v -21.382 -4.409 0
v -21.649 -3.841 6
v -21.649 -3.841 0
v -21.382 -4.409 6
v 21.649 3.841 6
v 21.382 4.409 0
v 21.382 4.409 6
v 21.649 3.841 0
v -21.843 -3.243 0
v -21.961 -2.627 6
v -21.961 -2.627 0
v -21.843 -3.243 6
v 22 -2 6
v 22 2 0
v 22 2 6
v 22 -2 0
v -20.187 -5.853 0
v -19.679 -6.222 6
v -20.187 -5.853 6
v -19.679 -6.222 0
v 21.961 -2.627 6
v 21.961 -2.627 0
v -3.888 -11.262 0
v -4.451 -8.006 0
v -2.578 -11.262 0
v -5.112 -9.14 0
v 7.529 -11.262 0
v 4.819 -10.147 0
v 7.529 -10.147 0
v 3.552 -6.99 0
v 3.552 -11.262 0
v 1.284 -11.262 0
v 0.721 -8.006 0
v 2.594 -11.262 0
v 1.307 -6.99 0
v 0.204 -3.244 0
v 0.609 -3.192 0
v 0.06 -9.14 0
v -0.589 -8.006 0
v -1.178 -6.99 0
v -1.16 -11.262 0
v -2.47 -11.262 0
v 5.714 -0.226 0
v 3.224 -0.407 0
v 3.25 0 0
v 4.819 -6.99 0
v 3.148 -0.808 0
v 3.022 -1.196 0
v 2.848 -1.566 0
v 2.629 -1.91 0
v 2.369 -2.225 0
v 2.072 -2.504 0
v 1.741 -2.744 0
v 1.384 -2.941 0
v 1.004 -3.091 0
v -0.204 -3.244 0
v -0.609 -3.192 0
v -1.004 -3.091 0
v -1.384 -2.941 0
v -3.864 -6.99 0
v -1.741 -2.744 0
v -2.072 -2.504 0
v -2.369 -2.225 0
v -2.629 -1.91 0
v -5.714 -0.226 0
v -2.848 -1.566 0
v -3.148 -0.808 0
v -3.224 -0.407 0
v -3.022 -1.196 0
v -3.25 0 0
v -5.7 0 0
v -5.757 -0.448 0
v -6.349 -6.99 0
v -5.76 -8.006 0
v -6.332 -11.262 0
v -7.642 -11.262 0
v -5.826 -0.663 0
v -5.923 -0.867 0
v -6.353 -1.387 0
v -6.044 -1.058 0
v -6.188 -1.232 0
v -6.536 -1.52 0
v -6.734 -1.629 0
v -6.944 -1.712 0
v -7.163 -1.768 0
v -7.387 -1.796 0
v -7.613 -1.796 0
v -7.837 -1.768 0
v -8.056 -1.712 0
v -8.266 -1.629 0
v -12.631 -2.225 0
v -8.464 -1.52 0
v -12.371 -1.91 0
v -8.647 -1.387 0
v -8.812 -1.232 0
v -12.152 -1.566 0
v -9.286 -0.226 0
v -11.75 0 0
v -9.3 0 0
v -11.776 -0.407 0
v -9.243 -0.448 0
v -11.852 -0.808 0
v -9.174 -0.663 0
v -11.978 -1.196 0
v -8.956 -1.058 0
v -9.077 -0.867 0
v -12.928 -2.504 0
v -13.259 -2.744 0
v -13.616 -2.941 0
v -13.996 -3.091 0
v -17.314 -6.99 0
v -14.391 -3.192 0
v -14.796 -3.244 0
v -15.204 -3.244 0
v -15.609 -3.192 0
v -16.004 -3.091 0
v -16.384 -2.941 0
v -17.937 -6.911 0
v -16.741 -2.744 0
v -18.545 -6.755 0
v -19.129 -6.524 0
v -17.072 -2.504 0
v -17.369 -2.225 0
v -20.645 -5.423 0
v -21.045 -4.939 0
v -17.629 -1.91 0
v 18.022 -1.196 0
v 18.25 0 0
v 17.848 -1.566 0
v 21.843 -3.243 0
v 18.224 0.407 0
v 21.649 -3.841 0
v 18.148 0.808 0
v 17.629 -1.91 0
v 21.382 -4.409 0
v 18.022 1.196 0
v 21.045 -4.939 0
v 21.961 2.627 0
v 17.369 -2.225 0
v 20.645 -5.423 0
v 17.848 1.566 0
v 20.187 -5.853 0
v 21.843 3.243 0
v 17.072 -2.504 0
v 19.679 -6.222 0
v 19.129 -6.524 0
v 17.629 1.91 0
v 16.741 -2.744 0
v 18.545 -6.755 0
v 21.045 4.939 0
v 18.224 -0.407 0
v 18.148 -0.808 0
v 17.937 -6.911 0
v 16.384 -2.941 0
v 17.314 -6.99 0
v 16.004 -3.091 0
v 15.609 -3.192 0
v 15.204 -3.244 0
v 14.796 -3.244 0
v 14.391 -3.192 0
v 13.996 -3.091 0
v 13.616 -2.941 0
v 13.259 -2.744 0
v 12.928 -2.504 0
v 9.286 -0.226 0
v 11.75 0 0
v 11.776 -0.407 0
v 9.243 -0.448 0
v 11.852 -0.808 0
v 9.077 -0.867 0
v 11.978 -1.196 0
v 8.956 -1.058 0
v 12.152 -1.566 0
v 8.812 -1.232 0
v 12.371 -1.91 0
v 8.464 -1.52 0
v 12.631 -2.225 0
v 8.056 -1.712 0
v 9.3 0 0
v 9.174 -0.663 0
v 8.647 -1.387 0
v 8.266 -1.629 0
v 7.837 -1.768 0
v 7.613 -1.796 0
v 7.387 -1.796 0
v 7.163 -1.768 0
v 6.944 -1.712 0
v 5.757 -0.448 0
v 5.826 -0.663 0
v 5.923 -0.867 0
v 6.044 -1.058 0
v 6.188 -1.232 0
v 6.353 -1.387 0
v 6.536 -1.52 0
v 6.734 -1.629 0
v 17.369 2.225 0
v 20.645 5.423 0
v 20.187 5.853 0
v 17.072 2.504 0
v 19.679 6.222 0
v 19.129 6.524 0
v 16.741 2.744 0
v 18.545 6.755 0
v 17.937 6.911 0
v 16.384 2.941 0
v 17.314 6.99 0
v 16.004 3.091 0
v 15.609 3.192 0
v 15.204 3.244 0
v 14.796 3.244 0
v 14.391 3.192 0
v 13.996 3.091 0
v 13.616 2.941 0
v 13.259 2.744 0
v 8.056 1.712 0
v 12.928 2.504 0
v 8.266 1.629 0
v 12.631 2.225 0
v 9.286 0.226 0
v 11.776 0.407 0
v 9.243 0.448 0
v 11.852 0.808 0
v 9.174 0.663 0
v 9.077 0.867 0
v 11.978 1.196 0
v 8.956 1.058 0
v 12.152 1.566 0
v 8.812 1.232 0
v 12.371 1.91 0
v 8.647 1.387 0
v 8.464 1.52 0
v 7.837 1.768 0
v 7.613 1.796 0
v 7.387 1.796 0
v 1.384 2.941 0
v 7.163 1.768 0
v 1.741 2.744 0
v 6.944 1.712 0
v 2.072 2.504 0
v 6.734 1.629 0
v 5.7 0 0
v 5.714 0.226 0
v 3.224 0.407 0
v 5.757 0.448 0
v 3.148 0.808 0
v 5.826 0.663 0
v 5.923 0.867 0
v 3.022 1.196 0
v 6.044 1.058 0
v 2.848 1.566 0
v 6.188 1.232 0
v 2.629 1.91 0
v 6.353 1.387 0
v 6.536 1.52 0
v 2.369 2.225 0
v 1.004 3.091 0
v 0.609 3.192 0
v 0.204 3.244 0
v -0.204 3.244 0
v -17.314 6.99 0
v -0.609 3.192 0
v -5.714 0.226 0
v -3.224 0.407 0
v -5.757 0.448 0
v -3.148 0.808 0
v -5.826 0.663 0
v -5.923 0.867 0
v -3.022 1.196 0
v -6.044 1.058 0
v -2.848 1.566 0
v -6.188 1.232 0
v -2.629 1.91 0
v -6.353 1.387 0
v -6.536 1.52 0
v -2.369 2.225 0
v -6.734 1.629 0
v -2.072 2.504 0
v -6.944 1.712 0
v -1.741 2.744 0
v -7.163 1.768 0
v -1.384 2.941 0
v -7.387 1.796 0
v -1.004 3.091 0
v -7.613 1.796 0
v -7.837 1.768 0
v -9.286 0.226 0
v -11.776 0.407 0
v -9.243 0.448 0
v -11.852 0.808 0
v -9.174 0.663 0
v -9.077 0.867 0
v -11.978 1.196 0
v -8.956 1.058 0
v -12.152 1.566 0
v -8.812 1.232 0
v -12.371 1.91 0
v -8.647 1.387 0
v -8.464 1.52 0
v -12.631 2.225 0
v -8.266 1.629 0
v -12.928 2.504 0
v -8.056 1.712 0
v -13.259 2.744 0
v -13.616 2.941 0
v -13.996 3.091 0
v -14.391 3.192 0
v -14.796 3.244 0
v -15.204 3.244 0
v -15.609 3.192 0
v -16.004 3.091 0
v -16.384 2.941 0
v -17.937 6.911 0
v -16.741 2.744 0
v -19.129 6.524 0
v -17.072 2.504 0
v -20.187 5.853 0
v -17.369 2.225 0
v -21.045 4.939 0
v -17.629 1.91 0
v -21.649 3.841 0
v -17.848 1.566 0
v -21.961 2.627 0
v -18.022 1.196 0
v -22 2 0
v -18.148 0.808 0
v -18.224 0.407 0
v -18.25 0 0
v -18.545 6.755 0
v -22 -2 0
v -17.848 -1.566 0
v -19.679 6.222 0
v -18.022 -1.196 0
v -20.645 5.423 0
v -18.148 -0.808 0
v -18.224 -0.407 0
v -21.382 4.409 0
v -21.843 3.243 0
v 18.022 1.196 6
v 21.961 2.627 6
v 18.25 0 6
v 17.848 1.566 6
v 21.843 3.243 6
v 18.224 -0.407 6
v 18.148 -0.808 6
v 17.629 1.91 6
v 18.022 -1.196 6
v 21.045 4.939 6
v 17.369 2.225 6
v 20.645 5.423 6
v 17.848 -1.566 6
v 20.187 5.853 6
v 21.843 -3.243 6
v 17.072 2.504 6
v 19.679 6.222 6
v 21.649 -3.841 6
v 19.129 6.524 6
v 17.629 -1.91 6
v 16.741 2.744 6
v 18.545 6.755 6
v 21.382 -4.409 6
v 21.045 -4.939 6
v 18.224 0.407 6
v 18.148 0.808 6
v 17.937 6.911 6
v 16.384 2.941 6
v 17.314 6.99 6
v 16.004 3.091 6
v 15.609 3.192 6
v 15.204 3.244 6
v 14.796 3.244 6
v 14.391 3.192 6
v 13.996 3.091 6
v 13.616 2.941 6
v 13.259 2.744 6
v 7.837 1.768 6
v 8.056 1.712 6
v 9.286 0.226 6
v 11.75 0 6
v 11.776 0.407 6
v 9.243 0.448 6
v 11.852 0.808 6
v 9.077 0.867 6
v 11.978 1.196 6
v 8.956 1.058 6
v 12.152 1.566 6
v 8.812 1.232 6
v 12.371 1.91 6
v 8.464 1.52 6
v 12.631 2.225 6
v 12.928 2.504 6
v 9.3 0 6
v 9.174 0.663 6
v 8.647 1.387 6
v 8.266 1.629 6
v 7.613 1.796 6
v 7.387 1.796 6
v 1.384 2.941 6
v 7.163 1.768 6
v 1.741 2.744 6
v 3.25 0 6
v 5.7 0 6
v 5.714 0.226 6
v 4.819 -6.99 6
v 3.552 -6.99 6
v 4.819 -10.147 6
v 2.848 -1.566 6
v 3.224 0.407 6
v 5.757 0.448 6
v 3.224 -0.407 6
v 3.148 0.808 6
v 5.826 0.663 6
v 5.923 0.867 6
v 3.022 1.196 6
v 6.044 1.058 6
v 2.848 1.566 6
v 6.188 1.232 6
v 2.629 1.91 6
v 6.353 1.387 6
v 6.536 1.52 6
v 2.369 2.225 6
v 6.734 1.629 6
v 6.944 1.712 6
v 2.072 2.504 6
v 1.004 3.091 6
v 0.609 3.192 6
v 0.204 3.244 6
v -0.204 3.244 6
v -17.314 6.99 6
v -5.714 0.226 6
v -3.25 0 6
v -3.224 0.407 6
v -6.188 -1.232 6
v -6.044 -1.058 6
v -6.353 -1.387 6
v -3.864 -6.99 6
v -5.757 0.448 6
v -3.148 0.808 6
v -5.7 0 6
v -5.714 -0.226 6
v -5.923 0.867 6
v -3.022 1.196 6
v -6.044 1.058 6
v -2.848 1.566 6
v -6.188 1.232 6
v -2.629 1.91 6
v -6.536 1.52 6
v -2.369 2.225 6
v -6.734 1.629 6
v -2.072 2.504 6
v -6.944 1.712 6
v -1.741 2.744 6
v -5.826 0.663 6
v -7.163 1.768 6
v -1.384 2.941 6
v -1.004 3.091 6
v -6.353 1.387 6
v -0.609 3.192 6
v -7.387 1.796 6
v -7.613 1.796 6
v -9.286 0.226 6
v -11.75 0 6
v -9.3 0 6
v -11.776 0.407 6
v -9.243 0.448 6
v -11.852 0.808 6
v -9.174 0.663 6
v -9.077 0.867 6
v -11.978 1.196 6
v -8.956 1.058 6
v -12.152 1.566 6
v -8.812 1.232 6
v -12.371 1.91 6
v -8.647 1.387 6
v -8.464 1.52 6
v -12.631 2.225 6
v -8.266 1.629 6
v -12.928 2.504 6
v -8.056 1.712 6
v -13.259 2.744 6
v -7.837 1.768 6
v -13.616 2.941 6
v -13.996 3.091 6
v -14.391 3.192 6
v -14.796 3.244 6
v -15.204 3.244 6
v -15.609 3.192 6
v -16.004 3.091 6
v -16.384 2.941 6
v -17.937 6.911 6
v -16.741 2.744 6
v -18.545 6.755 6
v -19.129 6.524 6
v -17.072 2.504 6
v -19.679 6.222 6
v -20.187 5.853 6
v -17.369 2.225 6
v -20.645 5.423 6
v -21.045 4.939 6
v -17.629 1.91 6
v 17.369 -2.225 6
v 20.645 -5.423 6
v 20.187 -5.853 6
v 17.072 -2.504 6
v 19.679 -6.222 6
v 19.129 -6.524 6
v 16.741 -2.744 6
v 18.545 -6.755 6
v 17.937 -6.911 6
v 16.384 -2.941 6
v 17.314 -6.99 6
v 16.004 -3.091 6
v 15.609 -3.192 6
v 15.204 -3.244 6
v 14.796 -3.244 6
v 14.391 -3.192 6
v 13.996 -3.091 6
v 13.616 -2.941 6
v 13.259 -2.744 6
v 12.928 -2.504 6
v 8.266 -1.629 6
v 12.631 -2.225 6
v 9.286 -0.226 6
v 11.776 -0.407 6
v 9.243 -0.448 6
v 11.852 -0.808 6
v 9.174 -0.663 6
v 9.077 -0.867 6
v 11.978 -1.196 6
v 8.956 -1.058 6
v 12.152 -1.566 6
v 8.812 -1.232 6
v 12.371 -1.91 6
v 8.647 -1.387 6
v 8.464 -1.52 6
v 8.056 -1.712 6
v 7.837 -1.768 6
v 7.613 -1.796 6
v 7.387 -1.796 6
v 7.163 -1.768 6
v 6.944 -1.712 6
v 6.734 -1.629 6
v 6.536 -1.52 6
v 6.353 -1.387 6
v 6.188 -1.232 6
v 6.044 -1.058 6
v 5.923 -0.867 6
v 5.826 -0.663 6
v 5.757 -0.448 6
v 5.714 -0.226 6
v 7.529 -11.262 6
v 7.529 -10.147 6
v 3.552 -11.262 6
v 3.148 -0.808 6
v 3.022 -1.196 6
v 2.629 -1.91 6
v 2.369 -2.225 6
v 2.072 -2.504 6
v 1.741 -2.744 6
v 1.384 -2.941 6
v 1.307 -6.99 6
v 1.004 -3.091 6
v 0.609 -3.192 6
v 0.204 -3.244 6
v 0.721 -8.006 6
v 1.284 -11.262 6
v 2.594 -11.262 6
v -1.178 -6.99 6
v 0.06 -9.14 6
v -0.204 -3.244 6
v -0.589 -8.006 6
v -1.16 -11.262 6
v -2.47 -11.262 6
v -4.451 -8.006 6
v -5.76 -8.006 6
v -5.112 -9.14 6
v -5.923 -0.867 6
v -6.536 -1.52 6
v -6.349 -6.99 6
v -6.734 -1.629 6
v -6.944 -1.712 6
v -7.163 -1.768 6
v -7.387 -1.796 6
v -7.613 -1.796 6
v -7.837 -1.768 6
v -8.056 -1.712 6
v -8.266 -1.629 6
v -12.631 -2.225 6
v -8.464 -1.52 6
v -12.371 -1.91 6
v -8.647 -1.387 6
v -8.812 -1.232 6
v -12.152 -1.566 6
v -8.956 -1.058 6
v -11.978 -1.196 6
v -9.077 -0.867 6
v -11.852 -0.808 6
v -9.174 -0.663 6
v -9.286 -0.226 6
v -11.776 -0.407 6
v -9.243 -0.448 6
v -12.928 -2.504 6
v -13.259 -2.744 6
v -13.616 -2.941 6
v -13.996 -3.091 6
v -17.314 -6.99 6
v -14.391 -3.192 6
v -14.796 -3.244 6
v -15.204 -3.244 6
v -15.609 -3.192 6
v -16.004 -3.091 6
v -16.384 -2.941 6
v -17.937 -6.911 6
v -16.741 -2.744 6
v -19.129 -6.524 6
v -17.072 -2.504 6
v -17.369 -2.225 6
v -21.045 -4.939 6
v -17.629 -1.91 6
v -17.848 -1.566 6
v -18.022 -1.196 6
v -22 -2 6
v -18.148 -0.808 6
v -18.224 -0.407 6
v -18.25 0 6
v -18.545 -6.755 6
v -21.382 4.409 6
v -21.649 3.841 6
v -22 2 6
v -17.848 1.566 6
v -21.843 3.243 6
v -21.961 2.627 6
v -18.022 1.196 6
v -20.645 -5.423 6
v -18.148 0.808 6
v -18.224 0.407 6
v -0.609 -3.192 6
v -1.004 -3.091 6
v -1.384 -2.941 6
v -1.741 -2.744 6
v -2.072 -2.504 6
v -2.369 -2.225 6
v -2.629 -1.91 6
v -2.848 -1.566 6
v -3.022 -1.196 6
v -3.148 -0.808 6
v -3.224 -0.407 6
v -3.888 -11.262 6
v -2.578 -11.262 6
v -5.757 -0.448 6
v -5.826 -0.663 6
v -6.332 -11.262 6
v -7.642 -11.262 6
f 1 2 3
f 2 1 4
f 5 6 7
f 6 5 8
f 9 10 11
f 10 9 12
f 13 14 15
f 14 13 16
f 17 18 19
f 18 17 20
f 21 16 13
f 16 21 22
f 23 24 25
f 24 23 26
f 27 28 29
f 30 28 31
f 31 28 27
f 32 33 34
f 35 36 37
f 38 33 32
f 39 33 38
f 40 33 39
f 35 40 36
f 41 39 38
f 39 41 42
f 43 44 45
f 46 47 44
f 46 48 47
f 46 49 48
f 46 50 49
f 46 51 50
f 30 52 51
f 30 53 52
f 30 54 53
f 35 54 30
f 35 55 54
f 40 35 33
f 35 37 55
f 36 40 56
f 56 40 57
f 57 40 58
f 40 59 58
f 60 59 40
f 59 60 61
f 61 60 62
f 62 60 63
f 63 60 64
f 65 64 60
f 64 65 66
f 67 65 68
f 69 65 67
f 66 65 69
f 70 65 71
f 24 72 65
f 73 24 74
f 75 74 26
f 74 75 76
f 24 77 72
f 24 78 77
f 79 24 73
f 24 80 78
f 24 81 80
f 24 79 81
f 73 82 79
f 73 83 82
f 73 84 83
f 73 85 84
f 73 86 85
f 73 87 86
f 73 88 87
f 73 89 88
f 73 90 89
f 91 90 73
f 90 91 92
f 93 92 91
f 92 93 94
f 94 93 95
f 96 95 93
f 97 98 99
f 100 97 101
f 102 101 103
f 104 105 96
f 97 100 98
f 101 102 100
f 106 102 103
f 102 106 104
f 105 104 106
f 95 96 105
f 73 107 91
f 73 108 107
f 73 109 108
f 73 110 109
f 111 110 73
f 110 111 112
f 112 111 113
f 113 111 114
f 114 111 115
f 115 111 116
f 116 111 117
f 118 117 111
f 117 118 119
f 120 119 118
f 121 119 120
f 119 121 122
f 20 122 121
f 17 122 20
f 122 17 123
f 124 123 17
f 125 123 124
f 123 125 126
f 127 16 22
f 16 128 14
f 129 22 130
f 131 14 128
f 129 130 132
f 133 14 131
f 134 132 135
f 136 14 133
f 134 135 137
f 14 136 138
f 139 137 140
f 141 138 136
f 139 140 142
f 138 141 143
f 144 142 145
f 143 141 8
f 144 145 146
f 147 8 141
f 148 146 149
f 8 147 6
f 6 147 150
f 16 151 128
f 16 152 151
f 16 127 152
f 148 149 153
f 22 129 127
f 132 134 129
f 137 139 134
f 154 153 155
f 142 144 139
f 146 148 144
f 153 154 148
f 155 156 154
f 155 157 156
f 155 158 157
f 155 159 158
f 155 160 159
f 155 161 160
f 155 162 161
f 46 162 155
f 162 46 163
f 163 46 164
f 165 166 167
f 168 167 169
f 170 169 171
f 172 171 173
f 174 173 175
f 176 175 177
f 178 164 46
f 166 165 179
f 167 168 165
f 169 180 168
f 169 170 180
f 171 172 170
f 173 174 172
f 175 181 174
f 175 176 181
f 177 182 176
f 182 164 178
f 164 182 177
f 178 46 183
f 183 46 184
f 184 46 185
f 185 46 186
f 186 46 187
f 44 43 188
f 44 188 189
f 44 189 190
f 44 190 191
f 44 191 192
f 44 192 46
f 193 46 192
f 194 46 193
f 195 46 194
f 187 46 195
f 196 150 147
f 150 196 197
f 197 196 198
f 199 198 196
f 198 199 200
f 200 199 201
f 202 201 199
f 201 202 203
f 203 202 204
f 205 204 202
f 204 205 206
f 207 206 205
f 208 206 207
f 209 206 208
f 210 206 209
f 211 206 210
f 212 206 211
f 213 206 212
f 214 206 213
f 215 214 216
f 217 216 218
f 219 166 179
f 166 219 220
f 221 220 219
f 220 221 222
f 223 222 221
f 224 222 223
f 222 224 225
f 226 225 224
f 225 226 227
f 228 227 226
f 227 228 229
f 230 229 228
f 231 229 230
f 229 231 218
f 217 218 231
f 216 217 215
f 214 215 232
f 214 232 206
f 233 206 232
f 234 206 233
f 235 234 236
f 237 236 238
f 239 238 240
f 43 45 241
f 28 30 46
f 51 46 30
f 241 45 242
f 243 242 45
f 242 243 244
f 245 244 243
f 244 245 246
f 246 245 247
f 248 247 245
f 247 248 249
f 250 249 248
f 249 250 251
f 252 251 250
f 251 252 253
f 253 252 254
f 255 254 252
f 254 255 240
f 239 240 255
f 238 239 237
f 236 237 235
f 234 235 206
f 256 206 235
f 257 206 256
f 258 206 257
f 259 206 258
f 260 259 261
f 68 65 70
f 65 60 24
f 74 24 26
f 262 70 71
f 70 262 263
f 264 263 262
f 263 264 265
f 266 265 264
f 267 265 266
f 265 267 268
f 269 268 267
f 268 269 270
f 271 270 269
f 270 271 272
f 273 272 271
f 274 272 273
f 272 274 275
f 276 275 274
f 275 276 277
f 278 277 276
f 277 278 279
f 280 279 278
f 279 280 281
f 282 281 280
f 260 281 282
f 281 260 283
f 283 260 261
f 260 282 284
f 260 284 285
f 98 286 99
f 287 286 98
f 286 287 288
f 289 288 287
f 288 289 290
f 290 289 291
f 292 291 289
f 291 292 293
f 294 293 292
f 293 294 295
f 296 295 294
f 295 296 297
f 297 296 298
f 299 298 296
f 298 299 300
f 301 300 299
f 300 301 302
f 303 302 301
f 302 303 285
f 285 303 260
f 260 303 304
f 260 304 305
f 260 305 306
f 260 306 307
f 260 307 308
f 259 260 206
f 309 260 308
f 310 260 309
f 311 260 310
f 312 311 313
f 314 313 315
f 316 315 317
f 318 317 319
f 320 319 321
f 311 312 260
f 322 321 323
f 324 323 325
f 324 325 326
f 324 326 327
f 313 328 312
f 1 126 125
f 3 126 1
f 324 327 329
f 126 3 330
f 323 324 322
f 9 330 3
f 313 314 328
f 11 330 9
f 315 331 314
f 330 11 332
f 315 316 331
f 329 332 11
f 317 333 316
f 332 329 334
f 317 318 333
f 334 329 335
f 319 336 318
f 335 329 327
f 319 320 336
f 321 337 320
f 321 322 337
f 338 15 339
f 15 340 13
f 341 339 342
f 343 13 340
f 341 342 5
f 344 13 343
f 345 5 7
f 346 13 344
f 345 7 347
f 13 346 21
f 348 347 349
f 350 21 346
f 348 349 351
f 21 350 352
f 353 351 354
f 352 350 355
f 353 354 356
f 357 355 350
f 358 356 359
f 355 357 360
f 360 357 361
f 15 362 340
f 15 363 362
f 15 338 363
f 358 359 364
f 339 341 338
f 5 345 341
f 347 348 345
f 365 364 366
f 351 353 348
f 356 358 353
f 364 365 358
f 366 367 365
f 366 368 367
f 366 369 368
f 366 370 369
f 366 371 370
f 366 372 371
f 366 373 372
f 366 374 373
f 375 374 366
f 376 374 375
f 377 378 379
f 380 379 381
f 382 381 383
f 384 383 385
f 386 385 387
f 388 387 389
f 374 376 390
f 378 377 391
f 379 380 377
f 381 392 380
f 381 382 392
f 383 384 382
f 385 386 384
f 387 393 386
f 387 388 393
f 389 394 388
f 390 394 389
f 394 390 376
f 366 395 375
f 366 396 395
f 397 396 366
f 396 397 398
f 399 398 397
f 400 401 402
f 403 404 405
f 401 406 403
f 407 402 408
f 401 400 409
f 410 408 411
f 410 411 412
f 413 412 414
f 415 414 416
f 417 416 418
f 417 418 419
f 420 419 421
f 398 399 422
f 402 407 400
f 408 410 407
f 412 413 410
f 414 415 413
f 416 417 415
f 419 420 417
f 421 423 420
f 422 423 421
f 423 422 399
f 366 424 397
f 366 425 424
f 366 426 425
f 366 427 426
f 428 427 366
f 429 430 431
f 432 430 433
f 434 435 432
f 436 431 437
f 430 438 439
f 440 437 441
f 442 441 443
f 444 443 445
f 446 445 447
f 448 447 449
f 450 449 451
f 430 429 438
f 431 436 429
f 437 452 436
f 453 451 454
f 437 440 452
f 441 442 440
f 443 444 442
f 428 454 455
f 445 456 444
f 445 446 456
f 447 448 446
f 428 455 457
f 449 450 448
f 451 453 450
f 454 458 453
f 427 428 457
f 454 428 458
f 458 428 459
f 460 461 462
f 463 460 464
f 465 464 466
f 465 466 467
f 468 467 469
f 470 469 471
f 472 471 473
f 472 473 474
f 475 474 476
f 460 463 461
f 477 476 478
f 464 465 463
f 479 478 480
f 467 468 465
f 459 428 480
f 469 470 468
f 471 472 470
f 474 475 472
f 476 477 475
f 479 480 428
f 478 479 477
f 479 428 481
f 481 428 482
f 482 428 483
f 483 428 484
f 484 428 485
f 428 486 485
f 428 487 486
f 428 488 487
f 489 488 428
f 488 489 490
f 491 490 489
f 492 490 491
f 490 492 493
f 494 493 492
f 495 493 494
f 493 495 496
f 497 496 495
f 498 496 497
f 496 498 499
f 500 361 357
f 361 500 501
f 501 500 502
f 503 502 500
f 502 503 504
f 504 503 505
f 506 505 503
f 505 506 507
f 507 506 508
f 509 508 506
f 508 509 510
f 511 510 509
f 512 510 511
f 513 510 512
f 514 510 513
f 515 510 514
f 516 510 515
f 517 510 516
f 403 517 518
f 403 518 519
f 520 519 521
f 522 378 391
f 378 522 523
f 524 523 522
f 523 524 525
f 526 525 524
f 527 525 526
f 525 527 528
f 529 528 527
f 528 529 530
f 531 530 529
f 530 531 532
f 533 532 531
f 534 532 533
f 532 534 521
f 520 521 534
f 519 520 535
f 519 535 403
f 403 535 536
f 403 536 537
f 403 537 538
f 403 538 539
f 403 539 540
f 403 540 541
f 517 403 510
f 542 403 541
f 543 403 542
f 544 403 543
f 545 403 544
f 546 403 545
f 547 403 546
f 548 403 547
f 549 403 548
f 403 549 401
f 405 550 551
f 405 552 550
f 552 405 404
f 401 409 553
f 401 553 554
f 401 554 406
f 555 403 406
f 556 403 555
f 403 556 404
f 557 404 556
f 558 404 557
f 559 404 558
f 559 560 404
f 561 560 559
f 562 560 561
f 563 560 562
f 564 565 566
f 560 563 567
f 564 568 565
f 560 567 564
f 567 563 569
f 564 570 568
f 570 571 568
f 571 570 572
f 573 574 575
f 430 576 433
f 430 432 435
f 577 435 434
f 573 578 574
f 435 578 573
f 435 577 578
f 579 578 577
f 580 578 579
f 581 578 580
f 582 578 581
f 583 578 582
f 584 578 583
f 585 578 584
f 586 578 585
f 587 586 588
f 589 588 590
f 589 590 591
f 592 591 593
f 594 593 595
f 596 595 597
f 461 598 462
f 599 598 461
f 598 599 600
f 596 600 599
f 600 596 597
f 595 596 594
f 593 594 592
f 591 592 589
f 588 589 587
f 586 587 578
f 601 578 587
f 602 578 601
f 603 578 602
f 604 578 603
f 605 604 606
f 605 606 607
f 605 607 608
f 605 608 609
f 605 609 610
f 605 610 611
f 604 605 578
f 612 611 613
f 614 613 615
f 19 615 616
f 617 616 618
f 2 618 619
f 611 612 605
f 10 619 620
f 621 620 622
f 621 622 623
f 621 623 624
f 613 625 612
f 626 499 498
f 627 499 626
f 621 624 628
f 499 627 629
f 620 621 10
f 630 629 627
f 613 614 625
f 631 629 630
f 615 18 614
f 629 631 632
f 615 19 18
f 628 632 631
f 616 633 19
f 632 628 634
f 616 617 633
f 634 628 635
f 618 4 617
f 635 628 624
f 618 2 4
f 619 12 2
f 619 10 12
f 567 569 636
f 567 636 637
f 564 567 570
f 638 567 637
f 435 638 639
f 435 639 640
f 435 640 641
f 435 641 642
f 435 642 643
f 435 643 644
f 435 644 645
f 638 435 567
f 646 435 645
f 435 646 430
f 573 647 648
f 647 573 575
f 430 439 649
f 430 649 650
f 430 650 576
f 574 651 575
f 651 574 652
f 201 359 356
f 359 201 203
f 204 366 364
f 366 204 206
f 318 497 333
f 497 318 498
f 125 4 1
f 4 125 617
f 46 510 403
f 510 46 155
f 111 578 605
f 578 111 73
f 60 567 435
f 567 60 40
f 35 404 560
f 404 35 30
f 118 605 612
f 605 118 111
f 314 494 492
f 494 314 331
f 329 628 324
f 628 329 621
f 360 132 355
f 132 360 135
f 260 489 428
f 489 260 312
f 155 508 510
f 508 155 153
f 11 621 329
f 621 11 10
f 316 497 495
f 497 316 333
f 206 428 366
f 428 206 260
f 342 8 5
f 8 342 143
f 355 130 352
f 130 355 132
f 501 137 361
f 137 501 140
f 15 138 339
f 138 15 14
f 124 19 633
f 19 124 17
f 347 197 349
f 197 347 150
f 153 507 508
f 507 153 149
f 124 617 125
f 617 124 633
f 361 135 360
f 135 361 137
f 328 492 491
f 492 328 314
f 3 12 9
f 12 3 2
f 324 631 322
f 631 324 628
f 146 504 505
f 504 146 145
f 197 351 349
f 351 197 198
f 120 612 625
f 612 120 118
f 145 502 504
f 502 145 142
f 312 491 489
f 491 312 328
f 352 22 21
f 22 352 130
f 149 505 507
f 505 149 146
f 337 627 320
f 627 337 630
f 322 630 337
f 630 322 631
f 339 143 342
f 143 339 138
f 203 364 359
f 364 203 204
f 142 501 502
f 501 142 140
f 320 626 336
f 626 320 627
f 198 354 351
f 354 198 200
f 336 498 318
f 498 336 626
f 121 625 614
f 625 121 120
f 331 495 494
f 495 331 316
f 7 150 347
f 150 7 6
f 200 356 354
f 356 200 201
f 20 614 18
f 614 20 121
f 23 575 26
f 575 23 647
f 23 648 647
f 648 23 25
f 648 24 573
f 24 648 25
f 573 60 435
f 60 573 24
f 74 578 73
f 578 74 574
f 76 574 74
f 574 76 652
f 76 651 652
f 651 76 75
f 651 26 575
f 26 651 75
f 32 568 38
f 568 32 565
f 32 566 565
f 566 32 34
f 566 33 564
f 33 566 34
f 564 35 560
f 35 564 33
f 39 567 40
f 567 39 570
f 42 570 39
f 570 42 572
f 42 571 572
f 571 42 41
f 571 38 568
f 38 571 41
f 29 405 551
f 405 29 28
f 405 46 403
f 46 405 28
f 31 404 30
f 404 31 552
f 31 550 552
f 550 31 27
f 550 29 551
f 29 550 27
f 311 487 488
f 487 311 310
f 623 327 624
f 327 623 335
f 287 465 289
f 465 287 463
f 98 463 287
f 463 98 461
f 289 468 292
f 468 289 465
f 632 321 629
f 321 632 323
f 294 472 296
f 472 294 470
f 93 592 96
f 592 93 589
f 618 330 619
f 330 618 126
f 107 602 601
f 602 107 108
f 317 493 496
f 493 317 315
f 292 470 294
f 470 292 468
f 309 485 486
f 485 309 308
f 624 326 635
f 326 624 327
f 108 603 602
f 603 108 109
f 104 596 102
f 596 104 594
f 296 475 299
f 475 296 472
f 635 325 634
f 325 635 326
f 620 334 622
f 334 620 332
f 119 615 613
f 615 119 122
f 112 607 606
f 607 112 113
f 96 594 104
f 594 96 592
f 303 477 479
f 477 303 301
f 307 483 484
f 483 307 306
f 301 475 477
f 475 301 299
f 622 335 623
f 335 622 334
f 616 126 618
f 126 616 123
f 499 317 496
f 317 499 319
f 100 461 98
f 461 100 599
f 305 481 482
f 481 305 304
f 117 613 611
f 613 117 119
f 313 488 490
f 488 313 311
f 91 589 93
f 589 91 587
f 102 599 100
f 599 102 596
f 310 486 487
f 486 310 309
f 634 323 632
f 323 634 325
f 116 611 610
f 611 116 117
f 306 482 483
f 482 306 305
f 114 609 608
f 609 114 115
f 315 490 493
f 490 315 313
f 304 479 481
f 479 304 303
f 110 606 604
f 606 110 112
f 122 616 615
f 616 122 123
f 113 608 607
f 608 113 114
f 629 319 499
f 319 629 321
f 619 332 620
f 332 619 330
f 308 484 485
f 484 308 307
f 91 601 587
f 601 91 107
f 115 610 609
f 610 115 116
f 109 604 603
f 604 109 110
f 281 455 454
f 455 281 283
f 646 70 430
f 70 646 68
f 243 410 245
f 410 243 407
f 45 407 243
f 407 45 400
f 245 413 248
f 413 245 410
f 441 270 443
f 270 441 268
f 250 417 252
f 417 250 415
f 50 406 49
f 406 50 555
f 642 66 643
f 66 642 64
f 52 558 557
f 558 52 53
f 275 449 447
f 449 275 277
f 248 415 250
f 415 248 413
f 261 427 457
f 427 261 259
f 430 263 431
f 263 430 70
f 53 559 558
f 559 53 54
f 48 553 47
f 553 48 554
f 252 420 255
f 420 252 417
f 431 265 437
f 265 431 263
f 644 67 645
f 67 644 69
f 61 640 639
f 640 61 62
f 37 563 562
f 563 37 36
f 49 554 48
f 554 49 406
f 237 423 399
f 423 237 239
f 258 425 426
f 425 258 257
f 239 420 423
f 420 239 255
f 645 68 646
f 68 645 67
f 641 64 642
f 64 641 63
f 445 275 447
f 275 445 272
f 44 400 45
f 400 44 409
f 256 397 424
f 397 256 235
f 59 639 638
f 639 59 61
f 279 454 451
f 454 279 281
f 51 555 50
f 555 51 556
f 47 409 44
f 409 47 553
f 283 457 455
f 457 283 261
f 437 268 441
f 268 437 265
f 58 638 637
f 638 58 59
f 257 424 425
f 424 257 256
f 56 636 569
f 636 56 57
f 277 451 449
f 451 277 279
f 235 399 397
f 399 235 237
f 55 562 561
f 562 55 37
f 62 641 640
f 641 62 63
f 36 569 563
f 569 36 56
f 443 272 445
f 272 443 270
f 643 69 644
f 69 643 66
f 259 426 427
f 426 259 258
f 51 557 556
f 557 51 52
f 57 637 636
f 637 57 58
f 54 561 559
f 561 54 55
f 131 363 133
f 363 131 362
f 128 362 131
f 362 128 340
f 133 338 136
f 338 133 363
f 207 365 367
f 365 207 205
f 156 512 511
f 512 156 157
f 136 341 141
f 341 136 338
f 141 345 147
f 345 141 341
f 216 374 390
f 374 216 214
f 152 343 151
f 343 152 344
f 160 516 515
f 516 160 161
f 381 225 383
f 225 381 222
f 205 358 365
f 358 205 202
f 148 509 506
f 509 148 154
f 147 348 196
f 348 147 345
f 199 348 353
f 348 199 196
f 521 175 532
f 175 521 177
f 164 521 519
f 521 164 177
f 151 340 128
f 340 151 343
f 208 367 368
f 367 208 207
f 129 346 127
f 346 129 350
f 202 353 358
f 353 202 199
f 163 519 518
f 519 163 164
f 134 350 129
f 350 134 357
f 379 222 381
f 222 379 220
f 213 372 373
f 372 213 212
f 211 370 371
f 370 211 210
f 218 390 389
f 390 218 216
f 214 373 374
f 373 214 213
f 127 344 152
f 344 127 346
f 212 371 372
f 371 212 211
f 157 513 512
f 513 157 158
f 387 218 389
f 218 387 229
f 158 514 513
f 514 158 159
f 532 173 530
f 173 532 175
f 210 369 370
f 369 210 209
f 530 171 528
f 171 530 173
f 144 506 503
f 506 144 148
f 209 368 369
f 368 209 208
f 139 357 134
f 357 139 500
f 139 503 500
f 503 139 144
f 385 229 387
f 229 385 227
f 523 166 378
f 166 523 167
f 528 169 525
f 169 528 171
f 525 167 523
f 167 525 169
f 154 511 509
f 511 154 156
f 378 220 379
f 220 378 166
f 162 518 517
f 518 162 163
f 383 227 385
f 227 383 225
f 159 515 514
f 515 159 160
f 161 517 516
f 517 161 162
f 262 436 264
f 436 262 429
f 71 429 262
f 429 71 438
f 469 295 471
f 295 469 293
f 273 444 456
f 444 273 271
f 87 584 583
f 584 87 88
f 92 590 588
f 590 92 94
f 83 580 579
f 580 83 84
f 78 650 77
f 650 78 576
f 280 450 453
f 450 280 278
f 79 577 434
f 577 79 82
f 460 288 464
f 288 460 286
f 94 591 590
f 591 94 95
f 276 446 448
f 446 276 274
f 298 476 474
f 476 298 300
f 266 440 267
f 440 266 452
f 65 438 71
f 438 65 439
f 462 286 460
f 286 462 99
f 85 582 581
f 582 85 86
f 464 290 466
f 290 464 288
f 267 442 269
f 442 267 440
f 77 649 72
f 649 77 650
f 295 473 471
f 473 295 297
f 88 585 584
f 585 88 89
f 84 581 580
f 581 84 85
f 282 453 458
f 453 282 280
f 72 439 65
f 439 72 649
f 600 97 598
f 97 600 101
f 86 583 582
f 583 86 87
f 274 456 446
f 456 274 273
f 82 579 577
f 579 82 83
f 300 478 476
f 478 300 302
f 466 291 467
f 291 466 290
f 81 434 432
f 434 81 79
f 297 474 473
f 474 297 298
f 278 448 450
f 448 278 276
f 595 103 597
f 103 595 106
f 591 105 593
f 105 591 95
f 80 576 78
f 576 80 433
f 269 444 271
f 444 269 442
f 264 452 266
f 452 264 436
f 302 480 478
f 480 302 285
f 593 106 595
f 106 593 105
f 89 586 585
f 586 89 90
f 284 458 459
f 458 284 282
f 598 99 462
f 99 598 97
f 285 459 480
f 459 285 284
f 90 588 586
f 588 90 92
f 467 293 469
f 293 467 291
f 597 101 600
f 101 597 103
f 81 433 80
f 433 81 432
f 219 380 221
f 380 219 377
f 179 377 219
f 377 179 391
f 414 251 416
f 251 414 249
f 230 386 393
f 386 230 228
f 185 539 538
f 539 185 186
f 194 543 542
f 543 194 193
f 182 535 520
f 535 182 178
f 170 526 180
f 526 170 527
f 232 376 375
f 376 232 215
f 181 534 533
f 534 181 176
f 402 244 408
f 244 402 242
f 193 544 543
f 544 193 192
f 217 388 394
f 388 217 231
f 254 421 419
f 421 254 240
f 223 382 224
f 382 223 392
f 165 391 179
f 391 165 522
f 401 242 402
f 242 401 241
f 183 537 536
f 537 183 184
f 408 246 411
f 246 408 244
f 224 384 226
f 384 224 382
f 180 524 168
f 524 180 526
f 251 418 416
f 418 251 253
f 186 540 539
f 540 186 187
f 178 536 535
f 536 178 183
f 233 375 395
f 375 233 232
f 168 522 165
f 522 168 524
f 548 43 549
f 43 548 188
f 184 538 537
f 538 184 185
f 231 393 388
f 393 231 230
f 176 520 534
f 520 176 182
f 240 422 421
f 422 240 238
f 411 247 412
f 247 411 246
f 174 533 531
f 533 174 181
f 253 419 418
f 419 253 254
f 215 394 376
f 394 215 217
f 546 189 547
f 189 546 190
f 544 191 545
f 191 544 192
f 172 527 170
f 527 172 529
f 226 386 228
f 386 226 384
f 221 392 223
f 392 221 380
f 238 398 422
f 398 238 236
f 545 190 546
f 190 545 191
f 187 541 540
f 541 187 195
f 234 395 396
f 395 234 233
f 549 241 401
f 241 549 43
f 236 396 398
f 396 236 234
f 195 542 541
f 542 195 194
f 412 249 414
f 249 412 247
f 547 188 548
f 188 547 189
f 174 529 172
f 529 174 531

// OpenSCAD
$fn = 50;


difference() {
	union() {
		hull() {
			translate(v = [-17.0000000000, 2.0000000000, 0]) {
				cylinder(h = 6, r = 5);
			}
			translate(v = [17.0000000000, 2.0000000000, 0]) {
				cylinder(h = 6, r = 5);
			}
			translate(v = [-17.0000000000, -2.0000000000, 0]) {
				cylinder(h = 6, r = 5);
			}
			translate(v = [17.0000000000, -2.0000000000, 0]) {
				cylinder(h = 6, r = 5);
			}
		}
		translate(v = [0, -5, 0]) {
			linear_extrude(height = 6) {
				text(font = "DejaVu Sans Mono:style=Bold", halign = "center", size = 6.3333333333, text = "XXL", valign = "top");
			}
		}
	}
	union() {
		translate(v = [-15.0000000000, 0.0000000000, 0]) {
			translate(v = [0, 0, -100]) {
				cylinder(h = 200, r = 3.2500000000);
			}
		}
		translate(v = [0, 0, -100]) {
			cylinder(h = 200, r = 3.2500000000);
		}
		translate(v = [15.0000000000, 0.0000000000, 0]) {
			translate(v = [0, 0, -100]) {
				cylinder(h = 200, r = 3.2500000000);
			}
		}
		translate(v = [-15.0000000000, 0.0000000000, 0]) {
			translate(v = [0, 0, -100]) {
				cylinder(h = 200, r = 1.8000000000);
			}
		}
		translate(v = [-7.5000000000, 0.0000000000, 0]) {
			translate(v = [0, 0, -100]) {
				cylinder(h = 200, r = 1.8000000000);
			}
		}
		translate(v = [0, 0, -100]) {
			cylinder(h = 200, r = 1.8000000000);
		}
		translate(v = [7.5000000000, 0.0000000000, 0]) {
			translate(v = [0, 0, -100]) {
				cylinder(h = 200, r = 1.8000000000);
			}
		}
		translate(v = [15.0000000000, 0.0000000000, 0]) {
			translate(v = [0, 0, -100]) {
				cylinder(h = 200, r = 1.8000000000);
			}
		}
	}
}
